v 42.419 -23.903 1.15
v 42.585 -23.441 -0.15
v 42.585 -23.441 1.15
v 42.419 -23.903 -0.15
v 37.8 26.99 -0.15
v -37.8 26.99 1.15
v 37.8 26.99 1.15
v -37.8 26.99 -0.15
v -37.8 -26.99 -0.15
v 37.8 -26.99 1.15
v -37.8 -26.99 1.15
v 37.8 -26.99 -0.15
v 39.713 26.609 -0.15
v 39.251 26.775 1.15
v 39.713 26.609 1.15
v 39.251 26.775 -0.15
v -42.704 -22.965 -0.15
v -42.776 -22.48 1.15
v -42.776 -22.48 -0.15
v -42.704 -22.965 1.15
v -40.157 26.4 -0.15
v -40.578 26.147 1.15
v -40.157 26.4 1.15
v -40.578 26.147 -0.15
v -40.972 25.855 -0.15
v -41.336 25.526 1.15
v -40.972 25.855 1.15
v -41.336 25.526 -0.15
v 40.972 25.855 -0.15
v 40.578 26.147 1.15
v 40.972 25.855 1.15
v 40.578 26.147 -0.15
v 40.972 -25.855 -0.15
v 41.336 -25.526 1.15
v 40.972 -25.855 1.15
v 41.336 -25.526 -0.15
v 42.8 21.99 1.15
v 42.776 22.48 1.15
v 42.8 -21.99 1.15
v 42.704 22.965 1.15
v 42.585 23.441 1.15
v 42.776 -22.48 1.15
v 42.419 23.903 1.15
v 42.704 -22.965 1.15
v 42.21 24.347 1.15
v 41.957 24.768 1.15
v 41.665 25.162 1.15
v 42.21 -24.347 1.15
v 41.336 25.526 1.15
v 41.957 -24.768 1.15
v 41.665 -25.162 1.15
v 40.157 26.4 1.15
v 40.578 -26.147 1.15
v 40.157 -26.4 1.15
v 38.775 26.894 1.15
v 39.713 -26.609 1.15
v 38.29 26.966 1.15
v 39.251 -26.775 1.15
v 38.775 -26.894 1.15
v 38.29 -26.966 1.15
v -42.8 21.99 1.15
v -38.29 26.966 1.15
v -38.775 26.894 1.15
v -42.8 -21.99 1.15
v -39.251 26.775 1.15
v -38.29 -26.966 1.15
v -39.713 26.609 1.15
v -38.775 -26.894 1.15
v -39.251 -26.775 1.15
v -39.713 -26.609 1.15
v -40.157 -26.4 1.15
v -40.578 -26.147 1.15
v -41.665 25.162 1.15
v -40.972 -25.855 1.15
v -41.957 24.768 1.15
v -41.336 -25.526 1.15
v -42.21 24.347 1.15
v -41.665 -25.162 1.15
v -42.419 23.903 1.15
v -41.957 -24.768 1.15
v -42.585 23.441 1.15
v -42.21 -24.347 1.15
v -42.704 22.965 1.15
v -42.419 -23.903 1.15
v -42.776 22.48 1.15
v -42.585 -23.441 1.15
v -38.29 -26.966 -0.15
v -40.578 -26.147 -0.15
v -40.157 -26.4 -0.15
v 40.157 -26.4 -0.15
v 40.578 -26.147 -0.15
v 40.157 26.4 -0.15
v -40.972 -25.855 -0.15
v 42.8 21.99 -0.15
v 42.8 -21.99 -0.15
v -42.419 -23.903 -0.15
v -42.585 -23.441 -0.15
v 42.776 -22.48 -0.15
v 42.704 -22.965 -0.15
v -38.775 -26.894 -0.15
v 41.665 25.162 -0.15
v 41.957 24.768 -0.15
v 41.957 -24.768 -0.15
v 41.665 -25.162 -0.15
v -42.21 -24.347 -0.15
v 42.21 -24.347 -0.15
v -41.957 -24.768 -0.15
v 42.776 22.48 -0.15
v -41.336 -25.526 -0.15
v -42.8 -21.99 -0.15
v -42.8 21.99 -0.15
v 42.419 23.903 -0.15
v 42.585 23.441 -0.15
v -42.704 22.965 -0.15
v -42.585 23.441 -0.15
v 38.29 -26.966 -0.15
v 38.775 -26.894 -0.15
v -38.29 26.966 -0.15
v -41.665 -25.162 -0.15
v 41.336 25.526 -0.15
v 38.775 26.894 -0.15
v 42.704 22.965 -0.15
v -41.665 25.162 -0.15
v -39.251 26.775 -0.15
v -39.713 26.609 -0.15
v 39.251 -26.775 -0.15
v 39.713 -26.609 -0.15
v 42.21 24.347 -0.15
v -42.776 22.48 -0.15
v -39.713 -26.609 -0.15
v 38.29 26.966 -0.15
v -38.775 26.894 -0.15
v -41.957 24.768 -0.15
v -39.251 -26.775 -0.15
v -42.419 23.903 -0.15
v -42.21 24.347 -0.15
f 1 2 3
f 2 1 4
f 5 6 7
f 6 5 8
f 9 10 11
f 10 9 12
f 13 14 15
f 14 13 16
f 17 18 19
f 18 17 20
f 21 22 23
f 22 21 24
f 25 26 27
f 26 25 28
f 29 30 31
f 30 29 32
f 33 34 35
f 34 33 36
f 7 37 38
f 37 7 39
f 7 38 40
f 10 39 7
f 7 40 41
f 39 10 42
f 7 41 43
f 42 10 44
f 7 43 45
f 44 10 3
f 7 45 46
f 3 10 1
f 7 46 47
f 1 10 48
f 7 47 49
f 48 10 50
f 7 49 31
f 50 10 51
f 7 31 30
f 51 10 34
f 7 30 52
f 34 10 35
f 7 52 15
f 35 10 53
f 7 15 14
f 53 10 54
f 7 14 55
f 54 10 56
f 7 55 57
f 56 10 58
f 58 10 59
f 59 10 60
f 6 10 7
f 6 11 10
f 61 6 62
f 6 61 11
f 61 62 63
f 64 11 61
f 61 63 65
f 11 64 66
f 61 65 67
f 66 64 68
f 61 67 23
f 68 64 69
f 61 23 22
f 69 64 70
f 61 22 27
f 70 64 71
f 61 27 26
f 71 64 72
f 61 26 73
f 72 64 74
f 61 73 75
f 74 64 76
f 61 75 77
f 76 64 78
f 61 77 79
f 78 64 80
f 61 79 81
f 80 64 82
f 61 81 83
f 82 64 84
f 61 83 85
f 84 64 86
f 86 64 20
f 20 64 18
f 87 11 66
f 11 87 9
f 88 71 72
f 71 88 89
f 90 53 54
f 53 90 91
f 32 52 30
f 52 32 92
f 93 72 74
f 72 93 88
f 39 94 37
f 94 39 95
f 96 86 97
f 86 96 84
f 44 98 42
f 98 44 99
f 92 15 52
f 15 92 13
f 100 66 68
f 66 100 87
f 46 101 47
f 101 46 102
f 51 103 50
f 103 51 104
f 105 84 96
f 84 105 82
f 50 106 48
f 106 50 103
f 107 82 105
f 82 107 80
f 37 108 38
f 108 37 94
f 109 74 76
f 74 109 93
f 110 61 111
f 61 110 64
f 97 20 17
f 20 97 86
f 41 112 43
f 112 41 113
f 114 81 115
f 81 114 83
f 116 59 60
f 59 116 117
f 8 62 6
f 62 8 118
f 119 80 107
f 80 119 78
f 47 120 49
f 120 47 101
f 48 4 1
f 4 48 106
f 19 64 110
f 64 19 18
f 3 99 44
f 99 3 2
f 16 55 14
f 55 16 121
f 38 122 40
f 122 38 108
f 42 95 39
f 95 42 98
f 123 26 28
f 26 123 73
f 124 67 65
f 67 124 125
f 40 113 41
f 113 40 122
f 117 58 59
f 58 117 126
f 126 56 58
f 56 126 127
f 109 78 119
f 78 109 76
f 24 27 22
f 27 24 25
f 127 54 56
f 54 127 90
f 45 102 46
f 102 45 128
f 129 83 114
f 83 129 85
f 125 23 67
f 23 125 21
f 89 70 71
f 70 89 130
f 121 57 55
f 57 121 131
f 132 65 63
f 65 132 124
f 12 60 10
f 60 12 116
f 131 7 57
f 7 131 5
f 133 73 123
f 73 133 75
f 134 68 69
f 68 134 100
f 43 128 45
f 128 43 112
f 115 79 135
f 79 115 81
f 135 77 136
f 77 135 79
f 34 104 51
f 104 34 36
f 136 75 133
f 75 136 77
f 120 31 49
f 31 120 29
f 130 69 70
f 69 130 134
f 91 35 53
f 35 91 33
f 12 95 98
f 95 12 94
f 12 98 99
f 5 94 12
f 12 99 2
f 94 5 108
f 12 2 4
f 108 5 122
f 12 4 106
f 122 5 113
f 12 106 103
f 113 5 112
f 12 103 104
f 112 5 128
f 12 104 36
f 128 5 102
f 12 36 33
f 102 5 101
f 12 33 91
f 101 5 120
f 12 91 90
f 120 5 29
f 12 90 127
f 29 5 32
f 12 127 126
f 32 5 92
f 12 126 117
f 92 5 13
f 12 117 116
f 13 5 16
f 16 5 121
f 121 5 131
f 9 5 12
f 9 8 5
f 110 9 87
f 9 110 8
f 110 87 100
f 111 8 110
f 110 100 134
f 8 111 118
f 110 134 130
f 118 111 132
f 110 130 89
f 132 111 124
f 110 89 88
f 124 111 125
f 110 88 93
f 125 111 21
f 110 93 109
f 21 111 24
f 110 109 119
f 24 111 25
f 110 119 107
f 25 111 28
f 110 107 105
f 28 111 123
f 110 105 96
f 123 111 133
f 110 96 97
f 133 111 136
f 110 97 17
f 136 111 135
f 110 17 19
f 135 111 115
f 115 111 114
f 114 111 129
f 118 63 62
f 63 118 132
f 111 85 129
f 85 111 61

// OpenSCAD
$fn = 64;
module card(x, y, z, border_radius) {
    
//    color ("pink") linear_extrude(height = 10, center = true, convexity = 10)
//        import (file = "puig-logo.dxf");
    
    difference() {
        minkowski()
        {
            cube(size=[x-border_radius*2,y-border_radius*2,z], center=true);
            cylinder(r=border_radius);
        }    
    
        translate([0,y/4,0]) {       
        rotate([0,180,180]) scale([0.25,0.25,1]) text("Champions League 2017")  linear_extrude(height = 1, center = true, convexity = 1);
        
        translate([0,5,0]) rotate([0,180,180]) scale([0.25,0.25,1]) text("Institut Puig Castellar")  linear_extrude(height = 1, center = true, convexity = 1);
 }
        
    //    translate([0,5+5/1.5,0]) rotate([0,180,180]) scale([0.125,0.125,1]) text("20 de decembre de 2017")  linear_extrude(height = 1, center = true, convexity = 1);
    }
}

$X = 85.60;
$Y = 53.98;
$Z = 0.3;
$BORDER_RADIUS = 5;

card($X, $Y, $Z, $BORDER_RADIUS);
